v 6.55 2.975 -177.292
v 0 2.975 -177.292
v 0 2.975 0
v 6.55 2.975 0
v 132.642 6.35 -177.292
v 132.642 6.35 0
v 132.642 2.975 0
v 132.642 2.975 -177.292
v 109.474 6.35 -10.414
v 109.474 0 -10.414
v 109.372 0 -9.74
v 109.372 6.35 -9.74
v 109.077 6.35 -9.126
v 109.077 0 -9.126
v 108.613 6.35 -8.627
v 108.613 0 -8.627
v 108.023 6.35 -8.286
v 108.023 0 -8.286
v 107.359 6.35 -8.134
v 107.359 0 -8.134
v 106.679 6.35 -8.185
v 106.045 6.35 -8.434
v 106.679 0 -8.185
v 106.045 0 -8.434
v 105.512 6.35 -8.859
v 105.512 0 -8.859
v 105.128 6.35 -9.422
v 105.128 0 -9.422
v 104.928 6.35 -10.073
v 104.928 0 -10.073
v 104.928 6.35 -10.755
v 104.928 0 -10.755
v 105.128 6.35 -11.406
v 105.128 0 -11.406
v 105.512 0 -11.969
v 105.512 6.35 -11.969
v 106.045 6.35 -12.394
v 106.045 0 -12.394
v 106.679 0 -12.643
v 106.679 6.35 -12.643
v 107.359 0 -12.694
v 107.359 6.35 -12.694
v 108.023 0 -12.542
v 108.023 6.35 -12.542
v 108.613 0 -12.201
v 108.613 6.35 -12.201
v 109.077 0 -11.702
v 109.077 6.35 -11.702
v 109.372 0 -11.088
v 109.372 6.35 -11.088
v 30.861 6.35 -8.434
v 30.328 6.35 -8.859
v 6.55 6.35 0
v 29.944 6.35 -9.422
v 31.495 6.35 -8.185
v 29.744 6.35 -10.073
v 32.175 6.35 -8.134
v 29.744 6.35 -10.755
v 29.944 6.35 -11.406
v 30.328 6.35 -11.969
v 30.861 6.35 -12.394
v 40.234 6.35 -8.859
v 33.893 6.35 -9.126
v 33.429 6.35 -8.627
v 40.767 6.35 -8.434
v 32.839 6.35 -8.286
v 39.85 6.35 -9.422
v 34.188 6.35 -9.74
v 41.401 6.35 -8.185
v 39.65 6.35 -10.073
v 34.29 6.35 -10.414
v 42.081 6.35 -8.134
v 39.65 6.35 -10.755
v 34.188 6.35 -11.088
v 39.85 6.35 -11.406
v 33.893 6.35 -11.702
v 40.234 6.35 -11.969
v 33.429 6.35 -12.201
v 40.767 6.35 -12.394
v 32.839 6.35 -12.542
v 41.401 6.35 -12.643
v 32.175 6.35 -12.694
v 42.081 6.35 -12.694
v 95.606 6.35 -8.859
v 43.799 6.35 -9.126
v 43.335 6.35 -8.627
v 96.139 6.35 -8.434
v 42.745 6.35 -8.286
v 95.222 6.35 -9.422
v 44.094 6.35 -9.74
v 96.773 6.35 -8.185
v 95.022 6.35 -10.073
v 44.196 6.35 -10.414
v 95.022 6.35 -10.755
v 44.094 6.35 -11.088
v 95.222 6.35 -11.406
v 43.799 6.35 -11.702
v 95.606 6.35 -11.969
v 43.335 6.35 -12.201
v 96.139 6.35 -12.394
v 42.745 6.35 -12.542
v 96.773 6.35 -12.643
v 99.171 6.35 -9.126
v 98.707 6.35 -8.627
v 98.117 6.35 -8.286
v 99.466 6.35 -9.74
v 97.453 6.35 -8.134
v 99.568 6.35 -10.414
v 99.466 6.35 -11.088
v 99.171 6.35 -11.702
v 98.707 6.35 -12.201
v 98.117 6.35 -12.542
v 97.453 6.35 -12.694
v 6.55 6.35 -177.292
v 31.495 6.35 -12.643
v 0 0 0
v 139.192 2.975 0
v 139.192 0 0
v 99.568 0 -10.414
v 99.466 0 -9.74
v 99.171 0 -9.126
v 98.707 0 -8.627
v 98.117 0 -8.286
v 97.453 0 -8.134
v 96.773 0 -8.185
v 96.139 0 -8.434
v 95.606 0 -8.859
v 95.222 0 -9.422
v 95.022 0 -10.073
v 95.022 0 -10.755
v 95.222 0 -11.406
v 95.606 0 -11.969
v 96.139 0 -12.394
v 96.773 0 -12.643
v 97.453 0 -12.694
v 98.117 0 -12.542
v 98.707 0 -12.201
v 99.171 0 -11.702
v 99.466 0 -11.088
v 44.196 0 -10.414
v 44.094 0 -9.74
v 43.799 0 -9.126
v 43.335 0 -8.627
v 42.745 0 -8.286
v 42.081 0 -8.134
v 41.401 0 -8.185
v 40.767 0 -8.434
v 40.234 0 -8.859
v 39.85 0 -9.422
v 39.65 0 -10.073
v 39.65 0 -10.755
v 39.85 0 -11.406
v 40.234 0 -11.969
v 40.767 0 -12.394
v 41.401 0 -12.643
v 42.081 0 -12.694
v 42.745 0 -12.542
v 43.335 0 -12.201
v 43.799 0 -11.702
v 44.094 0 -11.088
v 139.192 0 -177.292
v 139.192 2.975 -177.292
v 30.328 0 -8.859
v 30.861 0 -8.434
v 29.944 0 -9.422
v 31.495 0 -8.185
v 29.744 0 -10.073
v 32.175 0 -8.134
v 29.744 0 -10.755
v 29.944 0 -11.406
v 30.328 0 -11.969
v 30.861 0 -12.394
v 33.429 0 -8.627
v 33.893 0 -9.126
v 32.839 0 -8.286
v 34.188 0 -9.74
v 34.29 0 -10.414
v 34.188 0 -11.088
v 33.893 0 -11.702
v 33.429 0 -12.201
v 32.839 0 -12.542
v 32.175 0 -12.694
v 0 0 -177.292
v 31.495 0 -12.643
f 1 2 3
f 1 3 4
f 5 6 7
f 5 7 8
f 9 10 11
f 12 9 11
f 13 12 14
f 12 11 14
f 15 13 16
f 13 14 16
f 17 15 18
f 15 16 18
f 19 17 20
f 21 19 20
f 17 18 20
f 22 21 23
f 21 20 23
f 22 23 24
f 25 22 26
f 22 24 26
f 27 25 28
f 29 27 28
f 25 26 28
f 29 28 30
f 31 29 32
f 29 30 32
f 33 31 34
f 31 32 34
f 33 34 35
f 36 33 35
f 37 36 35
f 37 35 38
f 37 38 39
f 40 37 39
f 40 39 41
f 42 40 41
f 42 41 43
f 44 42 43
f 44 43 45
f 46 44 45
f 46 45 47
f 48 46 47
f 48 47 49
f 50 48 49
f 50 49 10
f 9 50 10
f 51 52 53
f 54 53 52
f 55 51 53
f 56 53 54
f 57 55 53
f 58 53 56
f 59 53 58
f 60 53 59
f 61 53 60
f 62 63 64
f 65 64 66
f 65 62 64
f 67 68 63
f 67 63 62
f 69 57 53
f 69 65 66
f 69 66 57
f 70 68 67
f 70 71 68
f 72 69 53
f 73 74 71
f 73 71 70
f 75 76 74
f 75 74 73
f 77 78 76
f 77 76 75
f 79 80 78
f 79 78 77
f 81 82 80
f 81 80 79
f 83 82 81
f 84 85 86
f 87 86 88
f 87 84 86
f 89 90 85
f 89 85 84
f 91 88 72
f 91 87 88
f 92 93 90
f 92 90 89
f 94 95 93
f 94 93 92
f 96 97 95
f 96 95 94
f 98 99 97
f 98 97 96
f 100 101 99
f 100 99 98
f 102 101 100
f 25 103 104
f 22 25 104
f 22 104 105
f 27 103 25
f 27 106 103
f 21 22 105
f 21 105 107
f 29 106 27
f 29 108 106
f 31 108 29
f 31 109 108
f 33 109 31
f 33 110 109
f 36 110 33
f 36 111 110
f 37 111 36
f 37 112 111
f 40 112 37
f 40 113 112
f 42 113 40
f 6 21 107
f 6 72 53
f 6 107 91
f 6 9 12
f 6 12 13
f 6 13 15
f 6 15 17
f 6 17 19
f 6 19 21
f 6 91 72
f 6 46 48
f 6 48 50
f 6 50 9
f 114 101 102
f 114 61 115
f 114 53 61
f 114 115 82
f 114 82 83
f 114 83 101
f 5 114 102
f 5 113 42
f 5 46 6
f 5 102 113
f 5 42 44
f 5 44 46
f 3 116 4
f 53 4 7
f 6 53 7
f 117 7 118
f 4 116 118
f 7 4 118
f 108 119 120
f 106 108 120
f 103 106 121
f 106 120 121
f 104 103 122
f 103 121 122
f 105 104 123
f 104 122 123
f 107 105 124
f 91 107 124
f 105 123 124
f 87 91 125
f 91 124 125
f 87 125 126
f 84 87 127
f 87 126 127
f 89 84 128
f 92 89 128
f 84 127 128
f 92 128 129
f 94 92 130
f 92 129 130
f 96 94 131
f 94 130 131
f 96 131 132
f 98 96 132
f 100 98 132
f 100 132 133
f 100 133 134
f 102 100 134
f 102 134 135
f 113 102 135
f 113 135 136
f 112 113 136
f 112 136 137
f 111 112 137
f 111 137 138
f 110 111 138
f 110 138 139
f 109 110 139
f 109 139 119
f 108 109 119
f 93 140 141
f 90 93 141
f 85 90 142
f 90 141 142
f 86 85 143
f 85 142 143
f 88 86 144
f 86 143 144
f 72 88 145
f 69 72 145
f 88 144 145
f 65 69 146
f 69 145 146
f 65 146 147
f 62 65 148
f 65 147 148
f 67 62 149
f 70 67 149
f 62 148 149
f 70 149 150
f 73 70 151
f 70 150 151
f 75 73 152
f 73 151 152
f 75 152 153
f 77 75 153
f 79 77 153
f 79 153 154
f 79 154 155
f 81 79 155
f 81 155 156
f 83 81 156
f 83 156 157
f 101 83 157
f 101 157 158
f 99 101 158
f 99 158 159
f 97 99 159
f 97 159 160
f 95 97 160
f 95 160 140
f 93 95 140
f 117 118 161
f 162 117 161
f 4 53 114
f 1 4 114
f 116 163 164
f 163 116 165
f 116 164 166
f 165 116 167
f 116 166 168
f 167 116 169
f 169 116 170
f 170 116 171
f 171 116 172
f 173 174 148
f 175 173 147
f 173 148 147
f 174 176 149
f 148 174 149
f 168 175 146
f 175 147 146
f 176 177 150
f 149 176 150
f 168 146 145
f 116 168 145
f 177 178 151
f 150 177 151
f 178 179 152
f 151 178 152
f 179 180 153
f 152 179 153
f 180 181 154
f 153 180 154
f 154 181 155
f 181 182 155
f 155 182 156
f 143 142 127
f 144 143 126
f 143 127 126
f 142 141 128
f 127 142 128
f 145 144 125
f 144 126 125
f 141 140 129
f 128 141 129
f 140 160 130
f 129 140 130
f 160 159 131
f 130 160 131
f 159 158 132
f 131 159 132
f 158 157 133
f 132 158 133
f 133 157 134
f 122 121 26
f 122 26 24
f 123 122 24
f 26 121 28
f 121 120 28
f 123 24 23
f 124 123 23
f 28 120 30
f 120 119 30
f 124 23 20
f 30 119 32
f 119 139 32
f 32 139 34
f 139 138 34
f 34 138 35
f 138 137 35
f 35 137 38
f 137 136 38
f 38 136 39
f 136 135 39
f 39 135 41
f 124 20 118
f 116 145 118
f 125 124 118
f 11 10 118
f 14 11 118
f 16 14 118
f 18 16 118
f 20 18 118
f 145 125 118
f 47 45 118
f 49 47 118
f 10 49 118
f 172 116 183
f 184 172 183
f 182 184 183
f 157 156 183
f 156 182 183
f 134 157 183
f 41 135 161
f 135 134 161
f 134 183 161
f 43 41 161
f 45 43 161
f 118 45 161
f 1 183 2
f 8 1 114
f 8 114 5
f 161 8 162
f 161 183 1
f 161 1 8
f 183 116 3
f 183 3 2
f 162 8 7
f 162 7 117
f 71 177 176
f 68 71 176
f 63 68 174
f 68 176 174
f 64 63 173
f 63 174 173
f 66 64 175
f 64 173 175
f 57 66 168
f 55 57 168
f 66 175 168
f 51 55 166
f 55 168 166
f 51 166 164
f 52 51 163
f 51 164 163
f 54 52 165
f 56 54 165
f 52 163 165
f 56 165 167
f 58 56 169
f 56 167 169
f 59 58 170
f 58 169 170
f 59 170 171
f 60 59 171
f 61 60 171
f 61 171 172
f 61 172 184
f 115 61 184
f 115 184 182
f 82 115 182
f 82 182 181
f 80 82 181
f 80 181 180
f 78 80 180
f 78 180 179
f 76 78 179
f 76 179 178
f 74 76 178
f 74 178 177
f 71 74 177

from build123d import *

# Parameters (mm, degrees)
SKETCH1_W           = 139.192
SKETCH1_H           = 177.292
BOSS_EXTRUDE1_DEPTH = 6.35
SKETCH2_W           = 6.55
SKETCH2_H           = 177.292
CUT_EXTRUDE1_DEPTH  = 3.375
SKETCH5_R           = 2.286
CUT_EXTRUDE3_DEPTH  = 12.7


with BuildPart() as part:
    # Sketch1 → Boss-Extrude1 (new body)
    with BuildSketch(Plane(origin=(0, 0, 0), x_dir=(1, 0, 0), z_dir=(0, 1, 0))):
        with Locations((69.596, 88.646)):
            Rectangle(SKETCH1_W, SKETCH1_H)
    extrude(amount=BOSS_EXTRUDE1_DEPTH)

    # Sketch2 → Cut-Extrude1 (cut)
    with BuildSketch(Plane(origin=(0, 6.35, 0), x_dir=(1, 0, 0), z_dir=(0, 1, 0))):
        with Locations((135.917, 88.646)):
            Rectangle(SKETCH2_W, SKETCH2_H)
        with Locations((3.275, 88.646)):
            Rectangle(SKETCH2_W, SKETCH2_H)
    extrude(amount=-CUT_EXTRUDE1_DEPTH, mode=Mode.SUBTRACT)

    # Sketch5 → Cut-Extrude3 (cut)
    with BuildSketch(Plane.XZ):
        with Locations((107.188, -10.414)):
            Circle(SKETCH5_R)
        with Locations((97.282, -10.414)):
            Circle(SKETCH5_R)
        with Locations((41.91, -10.414)):
            Circle(SKETCH5_R)
        with Locations((32.004, -10.414)):
            Circle(SKETCH5_R)
    extrude(amount=-CUT_EXTRUDE3_DEPTH, mode=Mode.SUBTRACT)


solid = part.part
